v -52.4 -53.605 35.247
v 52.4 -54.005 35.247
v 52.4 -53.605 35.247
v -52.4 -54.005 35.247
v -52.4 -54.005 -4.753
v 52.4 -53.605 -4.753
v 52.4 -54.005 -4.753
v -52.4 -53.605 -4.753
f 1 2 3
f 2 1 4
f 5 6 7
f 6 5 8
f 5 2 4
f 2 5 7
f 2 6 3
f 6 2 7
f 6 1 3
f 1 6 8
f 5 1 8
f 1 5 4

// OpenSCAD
// file: CONFIG_Prosperity.scad
cards = [
	[10, "Bank -", "Treasure"],
	[10, "Bishop -", "Action"],
	[10, "City -", "Action"],
	[10, "Contraband -", "Treasure"],
	[10, "Counting House -", "Action"],
	[10, "Expand -", "Action"],
	[10, "Forge -", "Action"],
	[10, "Goons -", "Action"],
	[10, "Grand Market -", "Action"],
	[10, "Hoard -", "Treasure"],
	[10, "King's Court -", "Action"],
	[10, "Loan -", "Treasure"],
	[10, "Mint -", "Action"],
	[10, "Monument -", "Action"],
	[10, "Mountebank -", "Action"],
	[10, "Peddler -", "Action"],
	[10, "Quarry -", "Treasure"],
	[10, "Rabble -", "Action"],
	[10, "Royal Seal -", "Treasure"],
	[10, "Talisman -", "Treasure"],
	[10, "Trade Route -", "Action"],
	[10, "Vault -", "Action"],
	[10, "Venture -", "Treasure"],
	[10, "WatchTower -", "Reaction"],
	[10, "worker's Village -", "Action"],

    [-6], [0], // Divider

	[25, "Randomizers -", "Action"]
];
// file: DominionBoxHelper.scad
cards = [];
forceBoxLength = 0;

$fn = 60;
cardThickness = 0.3231333;
deckTolorance = 0.5;
slotHeight = 40;
cardLength = 92;
cardWidth = 60;
deckShift = 14;
deckRotation = 7;
boxThickness = [2,1,2];
cardEdgeRadius = 4;
textPlateThickness = 0.4;
textThickness = 0.4;

rotatedWidth = cos(deckRotation) * (cardLength + deckShift);
rotatedHeight = cos(deckRotation) * (cardWidth) + sin(deckRotation) * (cardLength + deckShift);

allCardsThickness = cardThickness*sum_to_index(cards, len(cards)-1) + deckTolorance * len(cards);

boxSize = [
        max(forceBoxLength, allCardsThickness + 2 * boxThickness.x),
        rotatedWidth + 2 * boxThickness.y,
        slotHeight + boxThickness.z
        ];

module defineObject(object_name) {
    if (current_object != "ALL" && current_object != object_name) {
        *children();
    } else {
        children();
    }
}

function sum_to_index(arr, i) =
    i < 0 ? 0 : abs(arr[i][0]) + sum_to_index(arr, i - 1);
    
module deck(i)
{
    union()
    {
        depth = cardThickness*cards[i][0] + deckTolorance + 0.01;
        rotate([0,90,0])
        translate([(0.5*cardWidth - cardEdgeRadius), (0.5*cardLength - cardEdgeRadius), 0])
        cylinder(h=depth, r=cardEdgeRadius, center=true);
        rotate([0,90,0])
        translate([-(0.5*cardWidth - cardEdgeRadius), (0.5*cardLength - cardEdgeRadius), 0])
        cylinder(h=depth, r=cardEdgeRadius, center=true);
        rotate([0,90,0])
        translate([(0.5*cardWidth - cardEdgeRadius), -(0.5*cardLength - cardEdgeRadius), 0])
        cylinder(h=depth, r=cardEdgeRadius, center=true);
        rotate([0,90,0])
        translate([-(0.5*cardWidth - cardEdgeRadius), -(0.5*cardLength - cardEdgeRadius), 0])
        cylinder(h=depth, r=cardEdgeRadius, center=true);
        cube([depth, cardLength - 2 * cardEdgeRadius, cardWidth], true);
        cube([depth, cardLength, cardWidth - 2 * cardEdgeRadius], true);
    }
}
    
module cardSlot(i)
{
    slotThickness = cardThickness*cards[i][0] + deckTolorance + 0.01;
    rotate((i%2 ? -1 : 1) * deckRotation, [1,0,0])
    translate(0.5*[slotThickness, cardLength, cardWidth])
    translate(-0.5 * [allCardsThickness, cardLength, 0]) // center
    translate([cardThickness*sum_to_index(cards, i-1) + deckTolorance * i, (i%2 ? -0.5 : 0.5)*deckShift, 0])
    deck(i);
}

module tokenSlot()
{
    slotThickness = 20;
    
    translate(0.5*[slotThickness, cardLength, cardWidth])
    translate(-0.5 * [allCardsThickness, cardLength, 0]) // center
    translate([allCardsThickness, 0, 0])
    cube([slotThickness, cardLength, cardWidth], true);
}

module cardName(i)
{
    translate([cardThickness*sum_to_index(cards, i-1) + deckTolorance * i, 0, 0])
    translate(0.5*[cardThickness*cards[i][0], 0, -3])
    rotate([90,-90,0])
    {
        linear_extrude(height=textThickness)
        text(cards[i][1], 2.6, "overpass", halign = "right", valign = "center");
    }
}
// main file
include <DominionBoxHelper.scad>

include <CONFIG_Prosperity.scad>

//current_object = "ALL";
current_object = "TextPlate";
//current_object = "Action";
//current_object = "Reaction";
//current_object = "Treasure";
//current_object = "Victory";
//current_object = "Curse";
//current_object = "Duration";

translate([
    -0.5 * allCardsThickness, 
    -0.5 * boxSize.y - textPlateThickness, 
    slotHeight - sin(deckRotation)*(0.5*(cardLength-deckShift))])
union()
{
    
    defineObject("TextPlate") color([0.2,0.2,0.2])
    {
        
        translate([ 0,0,-slotHeight])
        cube([allCardsThickness, textPlateThickness, slotHeight]);
    }
    for( i = [0:len(cards)-1])
    {
        if (cards[i][0] > 0)
        {
            defineObject(cards[i][2]) color("white")
            {
                cardName(i);
            }
        }
    }
}
